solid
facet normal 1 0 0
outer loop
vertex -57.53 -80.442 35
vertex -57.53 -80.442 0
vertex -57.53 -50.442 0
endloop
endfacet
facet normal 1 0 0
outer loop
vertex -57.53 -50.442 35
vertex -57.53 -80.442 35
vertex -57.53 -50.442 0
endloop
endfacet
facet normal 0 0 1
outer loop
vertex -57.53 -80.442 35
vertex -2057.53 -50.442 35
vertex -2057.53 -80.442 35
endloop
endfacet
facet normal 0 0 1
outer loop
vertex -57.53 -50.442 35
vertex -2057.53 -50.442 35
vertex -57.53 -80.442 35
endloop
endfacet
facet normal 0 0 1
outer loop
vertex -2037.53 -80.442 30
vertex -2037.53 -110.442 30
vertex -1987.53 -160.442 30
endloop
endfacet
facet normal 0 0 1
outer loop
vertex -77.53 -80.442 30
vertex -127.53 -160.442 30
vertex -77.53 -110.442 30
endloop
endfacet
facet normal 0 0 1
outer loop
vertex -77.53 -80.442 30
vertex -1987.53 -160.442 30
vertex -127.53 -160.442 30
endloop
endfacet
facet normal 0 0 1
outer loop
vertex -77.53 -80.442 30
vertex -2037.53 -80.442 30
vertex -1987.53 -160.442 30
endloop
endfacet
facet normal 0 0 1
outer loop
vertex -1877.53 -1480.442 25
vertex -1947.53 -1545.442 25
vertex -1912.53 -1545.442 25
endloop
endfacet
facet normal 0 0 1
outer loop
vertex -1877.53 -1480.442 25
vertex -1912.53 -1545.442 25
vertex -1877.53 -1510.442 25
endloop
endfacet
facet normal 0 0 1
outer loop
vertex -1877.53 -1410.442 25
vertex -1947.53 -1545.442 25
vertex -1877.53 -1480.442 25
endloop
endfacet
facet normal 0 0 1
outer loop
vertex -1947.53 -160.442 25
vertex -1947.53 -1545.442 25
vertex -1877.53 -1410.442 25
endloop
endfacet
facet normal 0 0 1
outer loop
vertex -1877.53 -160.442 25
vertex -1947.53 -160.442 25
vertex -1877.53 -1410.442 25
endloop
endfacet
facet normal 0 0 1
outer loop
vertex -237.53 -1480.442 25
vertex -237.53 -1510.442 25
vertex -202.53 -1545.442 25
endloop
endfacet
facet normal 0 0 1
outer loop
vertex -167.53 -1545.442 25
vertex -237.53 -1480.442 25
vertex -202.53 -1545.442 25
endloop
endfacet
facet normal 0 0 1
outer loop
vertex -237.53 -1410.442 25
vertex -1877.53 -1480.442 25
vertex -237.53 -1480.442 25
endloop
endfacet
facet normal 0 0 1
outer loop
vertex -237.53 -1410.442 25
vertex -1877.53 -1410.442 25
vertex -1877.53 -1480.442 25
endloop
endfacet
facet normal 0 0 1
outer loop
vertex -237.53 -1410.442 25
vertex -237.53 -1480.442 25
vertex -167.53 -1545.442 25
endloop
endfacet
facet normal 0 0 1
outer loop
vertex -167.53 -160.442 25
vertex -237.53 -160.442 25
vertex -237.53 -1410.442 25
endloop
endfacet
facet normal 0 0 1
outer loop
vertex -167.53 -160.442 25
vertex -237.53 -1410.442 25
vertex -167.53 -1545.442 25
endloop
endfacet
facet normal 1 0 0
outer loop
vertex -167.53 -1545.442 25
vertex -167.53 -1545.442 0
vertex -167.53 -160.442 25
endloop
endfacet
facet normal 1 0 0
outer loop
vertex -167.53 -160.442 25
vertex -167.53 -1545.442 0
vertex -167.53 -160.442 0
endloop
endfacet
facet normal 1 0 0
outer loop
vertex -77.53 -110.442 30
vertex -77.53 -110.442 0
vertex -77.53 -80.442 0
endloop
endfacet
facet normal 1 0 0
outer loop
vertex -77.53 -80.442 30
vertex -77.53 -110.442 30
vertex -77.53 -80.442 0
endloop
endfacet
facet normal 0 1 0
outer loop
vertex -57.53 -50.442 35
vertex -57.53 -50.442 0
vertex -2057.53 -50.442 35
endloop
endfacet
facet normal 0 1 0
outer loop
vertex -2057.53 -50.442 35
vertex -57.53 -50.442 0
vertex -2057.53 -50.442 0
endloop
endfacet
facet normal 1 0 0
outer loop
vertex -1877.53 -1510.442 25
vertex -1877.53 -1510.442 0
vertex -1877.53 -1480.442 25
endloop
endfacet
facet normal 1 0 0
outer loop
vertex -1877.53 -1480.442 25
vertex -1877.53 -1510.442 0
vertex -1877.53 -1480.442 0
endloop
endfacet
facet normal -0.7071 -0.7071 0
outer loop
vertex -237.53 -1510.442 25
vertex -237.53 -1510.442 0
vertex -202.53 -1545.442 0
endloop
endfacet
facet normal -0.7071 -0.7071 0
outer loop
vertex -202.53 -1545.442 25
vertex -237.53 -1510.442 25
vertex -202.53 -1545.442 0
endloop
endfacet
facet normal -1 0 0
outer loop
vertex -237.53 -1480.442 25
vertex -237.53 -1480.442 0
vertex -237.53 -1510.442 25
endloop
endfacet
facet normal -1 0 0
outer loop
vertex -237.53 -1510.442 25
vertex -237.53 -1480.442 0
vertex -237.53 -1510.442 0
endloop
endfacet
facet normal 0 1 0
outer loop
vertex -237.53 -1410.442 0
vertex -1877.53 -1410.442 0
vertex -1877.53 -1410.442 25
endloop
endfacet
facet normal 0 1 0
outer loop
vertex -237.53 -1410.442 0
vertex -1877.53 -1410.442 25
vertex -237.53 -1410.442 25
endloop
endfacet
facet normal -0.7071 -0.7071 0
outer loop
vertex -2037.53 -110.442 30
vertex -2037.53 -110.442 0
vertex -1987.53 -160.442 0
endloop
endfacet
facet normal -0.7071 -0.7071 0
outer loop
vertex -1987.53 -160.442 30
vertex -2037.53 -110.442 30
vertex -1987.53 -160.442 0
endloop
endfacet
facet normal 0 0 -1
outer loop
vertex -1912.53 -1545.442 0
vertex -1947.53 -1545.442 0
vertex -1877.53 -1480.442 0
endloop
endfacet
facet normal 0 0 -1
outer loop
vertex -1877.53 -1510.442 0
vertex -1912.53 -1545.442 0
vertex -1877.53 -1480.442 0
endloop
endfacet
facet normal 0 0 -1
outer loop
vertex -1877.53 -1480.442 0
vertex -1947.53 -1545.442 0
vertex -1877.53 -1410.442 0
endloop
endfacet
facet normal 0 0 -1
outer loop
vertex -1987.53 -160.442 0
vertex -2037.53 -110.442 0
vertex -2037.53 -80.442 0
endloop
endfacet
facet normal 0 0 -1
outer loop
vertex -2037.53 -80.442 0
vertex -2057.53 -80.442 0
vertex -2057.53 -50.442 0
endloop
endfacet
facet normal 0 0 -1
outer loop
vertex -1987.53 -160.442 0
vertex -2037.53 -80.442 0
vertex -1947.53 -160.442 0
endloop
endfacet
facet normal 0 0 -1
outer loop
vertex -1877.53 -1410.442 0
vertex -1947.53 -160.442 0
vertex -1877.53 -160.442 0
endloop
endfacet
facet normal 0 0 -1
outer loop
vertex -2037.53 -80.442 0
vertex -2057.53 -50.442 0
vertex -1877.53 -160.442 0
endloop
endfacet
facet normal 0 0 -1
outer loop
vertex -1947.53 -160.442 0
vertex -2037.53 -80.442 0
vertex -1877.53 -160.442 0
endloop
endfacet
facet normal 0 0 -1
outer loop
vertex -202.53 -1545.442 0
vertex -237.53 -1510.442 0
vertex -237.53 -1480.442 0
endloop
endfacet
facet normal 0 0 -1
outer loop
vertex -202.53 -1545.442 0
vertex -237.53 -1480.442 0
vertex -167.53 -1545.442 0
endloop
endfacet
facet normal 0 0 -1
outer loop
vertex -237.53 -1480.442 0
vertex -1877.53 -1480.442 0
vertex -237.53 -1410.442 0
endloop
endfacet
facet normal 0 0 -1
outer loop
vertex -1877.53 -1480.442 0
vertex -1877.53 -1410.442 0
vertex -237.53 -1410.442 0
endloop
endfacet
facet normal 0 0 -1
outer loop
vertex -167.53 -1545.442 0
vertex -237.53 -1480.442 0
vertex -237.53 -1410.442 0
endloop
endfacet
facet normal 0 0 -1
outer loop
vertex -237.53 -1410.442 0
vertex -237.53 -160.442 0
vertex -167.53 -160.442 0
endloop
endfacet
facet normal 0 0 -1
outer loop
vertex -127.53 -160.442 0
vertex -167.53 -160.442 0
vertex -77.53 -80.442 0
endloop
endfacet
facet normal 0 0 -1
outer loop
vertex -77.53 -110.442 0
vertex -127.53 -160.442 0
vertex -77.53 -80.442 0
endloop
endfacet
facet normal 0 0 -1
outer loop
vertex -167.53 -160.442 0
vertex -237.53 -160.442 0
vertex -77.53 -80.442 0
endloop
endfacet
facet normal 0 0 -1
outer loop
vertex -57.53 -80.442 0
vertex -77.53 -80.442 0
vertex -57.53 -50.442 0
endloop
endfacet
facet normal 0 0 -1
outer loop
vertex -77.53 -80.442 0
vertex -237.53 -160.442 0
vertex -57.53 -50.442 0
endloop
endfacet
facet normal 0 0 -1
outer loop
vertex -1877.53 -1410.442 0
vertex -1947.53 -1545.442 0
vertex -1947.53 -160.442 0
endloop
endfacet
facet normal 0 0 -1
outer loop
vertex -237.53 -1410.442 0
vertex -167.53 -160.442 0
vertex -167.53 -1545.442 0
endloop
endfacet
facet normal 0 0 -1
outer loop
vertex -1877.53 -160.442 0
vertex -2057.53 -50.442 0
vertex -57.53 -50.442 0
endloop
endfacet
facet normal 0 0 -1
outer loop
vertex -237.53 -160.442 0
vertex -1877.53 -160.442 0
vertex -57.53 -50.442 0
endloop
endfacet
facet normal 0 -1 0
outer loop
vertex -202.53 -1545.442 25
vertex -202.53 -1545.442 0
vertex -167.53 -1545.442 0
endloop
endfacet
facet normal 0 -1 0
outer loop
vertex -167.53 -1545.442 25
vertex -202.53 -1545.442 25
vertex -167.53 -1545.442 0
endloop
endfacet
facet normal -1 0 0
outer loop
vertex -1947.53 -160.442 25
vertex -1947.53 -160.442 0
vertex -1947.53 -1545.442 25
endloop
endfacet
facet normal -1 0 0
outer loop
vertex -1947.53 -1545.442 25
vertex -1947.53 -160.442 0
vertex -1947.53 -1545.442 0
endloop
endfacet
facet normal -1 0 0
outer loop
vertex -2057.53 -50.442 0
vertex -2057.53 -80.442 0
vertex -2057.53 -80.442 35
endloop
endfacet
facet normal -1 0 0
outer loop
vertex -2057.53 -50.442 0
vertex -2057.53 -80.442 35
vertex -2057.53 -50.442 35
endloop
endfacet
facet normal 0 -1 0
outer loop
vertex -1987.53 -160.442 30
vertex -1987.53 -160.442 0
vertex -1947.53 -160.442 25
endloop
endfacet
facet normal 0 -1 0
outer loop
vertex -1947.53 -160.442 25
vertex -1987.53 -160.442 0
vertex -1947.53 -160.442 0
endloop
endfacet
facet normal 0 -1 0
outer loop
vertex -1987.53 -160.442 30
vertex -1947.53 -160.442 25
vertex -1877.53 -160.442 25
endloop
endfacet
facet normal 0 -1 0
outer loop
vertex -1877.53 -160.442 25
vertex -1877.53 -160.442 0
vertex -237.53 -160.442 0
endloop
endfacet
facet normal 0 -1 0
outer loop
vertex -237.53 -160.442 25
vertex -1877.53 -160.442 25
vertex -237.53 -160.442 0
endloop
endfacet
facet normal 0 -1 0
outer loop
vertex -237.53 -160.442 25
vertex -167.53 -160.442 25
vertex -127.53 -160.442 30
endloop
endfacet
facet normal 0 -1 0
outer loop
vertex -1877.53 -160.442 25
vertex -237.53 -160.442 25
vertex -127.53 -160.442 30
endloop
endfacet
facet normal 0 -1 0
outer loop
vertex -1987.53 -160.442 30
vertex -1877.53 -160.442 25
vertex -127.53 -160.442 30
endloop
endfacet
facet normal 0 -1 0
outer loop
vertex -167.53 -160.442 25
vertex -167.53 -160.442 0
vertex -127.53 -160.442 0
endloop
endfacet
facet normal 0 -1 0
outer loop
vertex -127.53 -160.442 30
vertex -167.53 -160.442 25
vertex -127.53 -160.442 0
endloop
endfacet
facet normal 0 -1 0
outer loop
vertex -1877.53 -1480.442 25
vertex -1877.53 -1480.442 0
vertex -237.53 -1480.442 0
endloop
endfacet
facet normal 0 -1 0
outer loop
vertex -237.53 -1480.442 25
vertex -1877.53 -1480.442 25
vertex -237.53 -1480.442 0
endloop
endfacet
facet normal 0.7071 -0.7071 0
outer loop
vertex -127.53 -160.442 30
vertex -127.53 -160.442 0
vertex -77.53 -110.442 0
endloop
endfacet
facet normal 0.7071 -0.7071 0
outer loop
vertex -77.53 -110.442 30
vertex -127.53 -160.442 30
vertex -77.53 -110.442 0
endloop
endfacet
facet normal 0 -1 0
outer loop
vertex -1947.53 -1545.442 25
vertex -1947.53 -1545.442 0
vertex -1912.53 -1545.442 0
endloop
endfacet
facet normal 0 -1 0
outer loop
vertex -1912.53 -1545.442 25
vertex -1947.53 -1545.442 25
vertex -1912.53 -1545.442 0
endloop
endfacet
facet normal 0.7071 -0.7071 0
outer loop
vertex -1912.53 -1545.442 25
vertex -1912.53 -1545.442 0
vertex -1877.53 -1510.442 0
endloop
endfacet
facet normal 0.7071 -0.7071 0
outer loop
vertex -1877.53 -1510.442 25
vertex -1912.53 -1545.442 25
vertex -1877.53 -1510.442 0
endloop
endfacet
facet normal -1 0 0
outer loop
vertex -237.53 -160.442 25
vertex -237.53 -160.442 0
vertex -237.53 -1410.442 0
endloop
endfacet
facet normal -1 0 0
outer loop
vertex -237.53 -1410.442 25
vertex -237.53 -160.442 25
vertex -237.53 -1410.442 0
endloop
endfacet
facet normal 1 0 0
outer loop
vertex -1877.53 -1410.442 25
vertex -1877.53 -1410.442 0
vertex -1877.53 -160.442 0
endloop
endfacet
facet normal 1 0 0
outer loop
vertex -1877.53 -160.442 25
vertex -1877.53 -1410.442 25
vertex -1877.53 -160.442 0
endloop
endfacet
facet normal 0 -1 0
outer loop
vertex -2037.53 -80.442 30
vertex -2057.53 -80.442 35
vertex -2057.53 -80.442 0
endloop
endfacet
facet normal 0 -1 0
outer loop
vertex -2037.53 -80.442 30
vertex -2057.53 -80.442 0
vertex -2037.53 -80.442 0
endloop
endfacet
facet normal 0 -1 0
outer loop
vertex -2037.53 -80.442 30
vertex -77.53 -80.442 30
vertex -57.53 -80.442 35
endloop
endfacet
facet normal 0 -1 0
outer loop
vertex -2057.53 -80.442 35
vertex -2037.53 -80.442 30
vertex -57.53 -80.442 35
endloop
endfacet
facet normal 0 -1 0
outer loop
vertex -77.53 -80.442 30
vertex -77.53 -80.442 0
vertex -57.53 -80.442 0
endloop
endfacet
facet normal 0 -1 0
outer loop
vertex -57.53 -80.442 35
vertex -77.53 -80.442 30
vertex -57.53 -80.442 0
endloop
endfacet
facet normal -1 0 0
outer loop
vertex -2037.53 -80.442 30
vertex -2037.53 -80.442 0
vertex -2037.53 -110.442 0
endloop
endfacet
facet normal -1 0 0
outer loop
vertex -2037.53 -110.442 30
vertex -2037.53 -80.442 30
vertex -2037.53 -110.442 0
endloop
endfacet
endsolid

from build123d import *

# Parameters (mm, degrees)
F1_DEPTH = 30
F0_W     = 20
F0_H     = 30
F0_W_2   = 1960
F2_DEPTH = 35
F0_W_3   = 1640
F0_H_2   = 70
F3_DEPTH = 25


with BuildPart() as f1:
    # F0 (on Top) → F1 (new body)
    with BuildSketch(Plane.XY):
        Polygon((-1947.5297451019, -160.4416549206), (-1877.5297451019, -160.4416549206), (-237.5297451019, -160.4416549206), (-167.5297451019, -160.4416549206), (-127.5297451019, -160.4416549206), (-77.5297451019, -110.4416549206), (-77.5297451019, -80.4416549206), (-2037.5297451019, -80.4416549206), (-2037.5297451019, -110.4416549206), (-1987.5297451019, -160.4416549206), align=None)
    extrude(amount=F1_DEPTH)

    # F0 (on Top) → F2 (join)
    with BuildSketch(Plane.XY):
        with Locations((-2047.5297451019, -65.4416549206)):
            Rectangle(F0_W, F0_H)
        with Locations((-1057.5297451019, -65.4416549206)):
            Rectangle(F0_W_2, F0_H)
        with Locations((-67.5297451019, -65.4416549206)):
            Rectangle(F0_W, F0_H)
    extrude(amount=F2_DEPTH)

    # F0 (on Top) → F3 (join)
    with BuildSketch(Plane.XY):
        Polygon((-1877.5297451019, -1410.4416549206), (-1877.5297451019, -160.4416549206), (-1947.5297451019, -160.4416549206), (-1947.5297451019, -1545.4416549206), (-1912.5297451019, -1545.4416549206), (-1877.5297451019, -1510.4416549206), (-1877.5297451019, -1480.4416549206), align=None)
        with Locations((-1057.5297451019, -1445.4416549206)):
            Rectangle(F0_W_3, F0_H_2)
        Polygon((-167.5297451019, -160.4416549206), (-237.5297451019, -160.4416549206), (-237.5297451019, -1410.4416549206), (-237.5297451019, -1480.4416549206), (-237.5297451019, -1510.4416549206), (-202.5297451019, -1545.4416549206), (-167.5297451019, -1545.4416549206), align=None)
    extrude(amount=F3_DEPTH)


solid = f1.part
